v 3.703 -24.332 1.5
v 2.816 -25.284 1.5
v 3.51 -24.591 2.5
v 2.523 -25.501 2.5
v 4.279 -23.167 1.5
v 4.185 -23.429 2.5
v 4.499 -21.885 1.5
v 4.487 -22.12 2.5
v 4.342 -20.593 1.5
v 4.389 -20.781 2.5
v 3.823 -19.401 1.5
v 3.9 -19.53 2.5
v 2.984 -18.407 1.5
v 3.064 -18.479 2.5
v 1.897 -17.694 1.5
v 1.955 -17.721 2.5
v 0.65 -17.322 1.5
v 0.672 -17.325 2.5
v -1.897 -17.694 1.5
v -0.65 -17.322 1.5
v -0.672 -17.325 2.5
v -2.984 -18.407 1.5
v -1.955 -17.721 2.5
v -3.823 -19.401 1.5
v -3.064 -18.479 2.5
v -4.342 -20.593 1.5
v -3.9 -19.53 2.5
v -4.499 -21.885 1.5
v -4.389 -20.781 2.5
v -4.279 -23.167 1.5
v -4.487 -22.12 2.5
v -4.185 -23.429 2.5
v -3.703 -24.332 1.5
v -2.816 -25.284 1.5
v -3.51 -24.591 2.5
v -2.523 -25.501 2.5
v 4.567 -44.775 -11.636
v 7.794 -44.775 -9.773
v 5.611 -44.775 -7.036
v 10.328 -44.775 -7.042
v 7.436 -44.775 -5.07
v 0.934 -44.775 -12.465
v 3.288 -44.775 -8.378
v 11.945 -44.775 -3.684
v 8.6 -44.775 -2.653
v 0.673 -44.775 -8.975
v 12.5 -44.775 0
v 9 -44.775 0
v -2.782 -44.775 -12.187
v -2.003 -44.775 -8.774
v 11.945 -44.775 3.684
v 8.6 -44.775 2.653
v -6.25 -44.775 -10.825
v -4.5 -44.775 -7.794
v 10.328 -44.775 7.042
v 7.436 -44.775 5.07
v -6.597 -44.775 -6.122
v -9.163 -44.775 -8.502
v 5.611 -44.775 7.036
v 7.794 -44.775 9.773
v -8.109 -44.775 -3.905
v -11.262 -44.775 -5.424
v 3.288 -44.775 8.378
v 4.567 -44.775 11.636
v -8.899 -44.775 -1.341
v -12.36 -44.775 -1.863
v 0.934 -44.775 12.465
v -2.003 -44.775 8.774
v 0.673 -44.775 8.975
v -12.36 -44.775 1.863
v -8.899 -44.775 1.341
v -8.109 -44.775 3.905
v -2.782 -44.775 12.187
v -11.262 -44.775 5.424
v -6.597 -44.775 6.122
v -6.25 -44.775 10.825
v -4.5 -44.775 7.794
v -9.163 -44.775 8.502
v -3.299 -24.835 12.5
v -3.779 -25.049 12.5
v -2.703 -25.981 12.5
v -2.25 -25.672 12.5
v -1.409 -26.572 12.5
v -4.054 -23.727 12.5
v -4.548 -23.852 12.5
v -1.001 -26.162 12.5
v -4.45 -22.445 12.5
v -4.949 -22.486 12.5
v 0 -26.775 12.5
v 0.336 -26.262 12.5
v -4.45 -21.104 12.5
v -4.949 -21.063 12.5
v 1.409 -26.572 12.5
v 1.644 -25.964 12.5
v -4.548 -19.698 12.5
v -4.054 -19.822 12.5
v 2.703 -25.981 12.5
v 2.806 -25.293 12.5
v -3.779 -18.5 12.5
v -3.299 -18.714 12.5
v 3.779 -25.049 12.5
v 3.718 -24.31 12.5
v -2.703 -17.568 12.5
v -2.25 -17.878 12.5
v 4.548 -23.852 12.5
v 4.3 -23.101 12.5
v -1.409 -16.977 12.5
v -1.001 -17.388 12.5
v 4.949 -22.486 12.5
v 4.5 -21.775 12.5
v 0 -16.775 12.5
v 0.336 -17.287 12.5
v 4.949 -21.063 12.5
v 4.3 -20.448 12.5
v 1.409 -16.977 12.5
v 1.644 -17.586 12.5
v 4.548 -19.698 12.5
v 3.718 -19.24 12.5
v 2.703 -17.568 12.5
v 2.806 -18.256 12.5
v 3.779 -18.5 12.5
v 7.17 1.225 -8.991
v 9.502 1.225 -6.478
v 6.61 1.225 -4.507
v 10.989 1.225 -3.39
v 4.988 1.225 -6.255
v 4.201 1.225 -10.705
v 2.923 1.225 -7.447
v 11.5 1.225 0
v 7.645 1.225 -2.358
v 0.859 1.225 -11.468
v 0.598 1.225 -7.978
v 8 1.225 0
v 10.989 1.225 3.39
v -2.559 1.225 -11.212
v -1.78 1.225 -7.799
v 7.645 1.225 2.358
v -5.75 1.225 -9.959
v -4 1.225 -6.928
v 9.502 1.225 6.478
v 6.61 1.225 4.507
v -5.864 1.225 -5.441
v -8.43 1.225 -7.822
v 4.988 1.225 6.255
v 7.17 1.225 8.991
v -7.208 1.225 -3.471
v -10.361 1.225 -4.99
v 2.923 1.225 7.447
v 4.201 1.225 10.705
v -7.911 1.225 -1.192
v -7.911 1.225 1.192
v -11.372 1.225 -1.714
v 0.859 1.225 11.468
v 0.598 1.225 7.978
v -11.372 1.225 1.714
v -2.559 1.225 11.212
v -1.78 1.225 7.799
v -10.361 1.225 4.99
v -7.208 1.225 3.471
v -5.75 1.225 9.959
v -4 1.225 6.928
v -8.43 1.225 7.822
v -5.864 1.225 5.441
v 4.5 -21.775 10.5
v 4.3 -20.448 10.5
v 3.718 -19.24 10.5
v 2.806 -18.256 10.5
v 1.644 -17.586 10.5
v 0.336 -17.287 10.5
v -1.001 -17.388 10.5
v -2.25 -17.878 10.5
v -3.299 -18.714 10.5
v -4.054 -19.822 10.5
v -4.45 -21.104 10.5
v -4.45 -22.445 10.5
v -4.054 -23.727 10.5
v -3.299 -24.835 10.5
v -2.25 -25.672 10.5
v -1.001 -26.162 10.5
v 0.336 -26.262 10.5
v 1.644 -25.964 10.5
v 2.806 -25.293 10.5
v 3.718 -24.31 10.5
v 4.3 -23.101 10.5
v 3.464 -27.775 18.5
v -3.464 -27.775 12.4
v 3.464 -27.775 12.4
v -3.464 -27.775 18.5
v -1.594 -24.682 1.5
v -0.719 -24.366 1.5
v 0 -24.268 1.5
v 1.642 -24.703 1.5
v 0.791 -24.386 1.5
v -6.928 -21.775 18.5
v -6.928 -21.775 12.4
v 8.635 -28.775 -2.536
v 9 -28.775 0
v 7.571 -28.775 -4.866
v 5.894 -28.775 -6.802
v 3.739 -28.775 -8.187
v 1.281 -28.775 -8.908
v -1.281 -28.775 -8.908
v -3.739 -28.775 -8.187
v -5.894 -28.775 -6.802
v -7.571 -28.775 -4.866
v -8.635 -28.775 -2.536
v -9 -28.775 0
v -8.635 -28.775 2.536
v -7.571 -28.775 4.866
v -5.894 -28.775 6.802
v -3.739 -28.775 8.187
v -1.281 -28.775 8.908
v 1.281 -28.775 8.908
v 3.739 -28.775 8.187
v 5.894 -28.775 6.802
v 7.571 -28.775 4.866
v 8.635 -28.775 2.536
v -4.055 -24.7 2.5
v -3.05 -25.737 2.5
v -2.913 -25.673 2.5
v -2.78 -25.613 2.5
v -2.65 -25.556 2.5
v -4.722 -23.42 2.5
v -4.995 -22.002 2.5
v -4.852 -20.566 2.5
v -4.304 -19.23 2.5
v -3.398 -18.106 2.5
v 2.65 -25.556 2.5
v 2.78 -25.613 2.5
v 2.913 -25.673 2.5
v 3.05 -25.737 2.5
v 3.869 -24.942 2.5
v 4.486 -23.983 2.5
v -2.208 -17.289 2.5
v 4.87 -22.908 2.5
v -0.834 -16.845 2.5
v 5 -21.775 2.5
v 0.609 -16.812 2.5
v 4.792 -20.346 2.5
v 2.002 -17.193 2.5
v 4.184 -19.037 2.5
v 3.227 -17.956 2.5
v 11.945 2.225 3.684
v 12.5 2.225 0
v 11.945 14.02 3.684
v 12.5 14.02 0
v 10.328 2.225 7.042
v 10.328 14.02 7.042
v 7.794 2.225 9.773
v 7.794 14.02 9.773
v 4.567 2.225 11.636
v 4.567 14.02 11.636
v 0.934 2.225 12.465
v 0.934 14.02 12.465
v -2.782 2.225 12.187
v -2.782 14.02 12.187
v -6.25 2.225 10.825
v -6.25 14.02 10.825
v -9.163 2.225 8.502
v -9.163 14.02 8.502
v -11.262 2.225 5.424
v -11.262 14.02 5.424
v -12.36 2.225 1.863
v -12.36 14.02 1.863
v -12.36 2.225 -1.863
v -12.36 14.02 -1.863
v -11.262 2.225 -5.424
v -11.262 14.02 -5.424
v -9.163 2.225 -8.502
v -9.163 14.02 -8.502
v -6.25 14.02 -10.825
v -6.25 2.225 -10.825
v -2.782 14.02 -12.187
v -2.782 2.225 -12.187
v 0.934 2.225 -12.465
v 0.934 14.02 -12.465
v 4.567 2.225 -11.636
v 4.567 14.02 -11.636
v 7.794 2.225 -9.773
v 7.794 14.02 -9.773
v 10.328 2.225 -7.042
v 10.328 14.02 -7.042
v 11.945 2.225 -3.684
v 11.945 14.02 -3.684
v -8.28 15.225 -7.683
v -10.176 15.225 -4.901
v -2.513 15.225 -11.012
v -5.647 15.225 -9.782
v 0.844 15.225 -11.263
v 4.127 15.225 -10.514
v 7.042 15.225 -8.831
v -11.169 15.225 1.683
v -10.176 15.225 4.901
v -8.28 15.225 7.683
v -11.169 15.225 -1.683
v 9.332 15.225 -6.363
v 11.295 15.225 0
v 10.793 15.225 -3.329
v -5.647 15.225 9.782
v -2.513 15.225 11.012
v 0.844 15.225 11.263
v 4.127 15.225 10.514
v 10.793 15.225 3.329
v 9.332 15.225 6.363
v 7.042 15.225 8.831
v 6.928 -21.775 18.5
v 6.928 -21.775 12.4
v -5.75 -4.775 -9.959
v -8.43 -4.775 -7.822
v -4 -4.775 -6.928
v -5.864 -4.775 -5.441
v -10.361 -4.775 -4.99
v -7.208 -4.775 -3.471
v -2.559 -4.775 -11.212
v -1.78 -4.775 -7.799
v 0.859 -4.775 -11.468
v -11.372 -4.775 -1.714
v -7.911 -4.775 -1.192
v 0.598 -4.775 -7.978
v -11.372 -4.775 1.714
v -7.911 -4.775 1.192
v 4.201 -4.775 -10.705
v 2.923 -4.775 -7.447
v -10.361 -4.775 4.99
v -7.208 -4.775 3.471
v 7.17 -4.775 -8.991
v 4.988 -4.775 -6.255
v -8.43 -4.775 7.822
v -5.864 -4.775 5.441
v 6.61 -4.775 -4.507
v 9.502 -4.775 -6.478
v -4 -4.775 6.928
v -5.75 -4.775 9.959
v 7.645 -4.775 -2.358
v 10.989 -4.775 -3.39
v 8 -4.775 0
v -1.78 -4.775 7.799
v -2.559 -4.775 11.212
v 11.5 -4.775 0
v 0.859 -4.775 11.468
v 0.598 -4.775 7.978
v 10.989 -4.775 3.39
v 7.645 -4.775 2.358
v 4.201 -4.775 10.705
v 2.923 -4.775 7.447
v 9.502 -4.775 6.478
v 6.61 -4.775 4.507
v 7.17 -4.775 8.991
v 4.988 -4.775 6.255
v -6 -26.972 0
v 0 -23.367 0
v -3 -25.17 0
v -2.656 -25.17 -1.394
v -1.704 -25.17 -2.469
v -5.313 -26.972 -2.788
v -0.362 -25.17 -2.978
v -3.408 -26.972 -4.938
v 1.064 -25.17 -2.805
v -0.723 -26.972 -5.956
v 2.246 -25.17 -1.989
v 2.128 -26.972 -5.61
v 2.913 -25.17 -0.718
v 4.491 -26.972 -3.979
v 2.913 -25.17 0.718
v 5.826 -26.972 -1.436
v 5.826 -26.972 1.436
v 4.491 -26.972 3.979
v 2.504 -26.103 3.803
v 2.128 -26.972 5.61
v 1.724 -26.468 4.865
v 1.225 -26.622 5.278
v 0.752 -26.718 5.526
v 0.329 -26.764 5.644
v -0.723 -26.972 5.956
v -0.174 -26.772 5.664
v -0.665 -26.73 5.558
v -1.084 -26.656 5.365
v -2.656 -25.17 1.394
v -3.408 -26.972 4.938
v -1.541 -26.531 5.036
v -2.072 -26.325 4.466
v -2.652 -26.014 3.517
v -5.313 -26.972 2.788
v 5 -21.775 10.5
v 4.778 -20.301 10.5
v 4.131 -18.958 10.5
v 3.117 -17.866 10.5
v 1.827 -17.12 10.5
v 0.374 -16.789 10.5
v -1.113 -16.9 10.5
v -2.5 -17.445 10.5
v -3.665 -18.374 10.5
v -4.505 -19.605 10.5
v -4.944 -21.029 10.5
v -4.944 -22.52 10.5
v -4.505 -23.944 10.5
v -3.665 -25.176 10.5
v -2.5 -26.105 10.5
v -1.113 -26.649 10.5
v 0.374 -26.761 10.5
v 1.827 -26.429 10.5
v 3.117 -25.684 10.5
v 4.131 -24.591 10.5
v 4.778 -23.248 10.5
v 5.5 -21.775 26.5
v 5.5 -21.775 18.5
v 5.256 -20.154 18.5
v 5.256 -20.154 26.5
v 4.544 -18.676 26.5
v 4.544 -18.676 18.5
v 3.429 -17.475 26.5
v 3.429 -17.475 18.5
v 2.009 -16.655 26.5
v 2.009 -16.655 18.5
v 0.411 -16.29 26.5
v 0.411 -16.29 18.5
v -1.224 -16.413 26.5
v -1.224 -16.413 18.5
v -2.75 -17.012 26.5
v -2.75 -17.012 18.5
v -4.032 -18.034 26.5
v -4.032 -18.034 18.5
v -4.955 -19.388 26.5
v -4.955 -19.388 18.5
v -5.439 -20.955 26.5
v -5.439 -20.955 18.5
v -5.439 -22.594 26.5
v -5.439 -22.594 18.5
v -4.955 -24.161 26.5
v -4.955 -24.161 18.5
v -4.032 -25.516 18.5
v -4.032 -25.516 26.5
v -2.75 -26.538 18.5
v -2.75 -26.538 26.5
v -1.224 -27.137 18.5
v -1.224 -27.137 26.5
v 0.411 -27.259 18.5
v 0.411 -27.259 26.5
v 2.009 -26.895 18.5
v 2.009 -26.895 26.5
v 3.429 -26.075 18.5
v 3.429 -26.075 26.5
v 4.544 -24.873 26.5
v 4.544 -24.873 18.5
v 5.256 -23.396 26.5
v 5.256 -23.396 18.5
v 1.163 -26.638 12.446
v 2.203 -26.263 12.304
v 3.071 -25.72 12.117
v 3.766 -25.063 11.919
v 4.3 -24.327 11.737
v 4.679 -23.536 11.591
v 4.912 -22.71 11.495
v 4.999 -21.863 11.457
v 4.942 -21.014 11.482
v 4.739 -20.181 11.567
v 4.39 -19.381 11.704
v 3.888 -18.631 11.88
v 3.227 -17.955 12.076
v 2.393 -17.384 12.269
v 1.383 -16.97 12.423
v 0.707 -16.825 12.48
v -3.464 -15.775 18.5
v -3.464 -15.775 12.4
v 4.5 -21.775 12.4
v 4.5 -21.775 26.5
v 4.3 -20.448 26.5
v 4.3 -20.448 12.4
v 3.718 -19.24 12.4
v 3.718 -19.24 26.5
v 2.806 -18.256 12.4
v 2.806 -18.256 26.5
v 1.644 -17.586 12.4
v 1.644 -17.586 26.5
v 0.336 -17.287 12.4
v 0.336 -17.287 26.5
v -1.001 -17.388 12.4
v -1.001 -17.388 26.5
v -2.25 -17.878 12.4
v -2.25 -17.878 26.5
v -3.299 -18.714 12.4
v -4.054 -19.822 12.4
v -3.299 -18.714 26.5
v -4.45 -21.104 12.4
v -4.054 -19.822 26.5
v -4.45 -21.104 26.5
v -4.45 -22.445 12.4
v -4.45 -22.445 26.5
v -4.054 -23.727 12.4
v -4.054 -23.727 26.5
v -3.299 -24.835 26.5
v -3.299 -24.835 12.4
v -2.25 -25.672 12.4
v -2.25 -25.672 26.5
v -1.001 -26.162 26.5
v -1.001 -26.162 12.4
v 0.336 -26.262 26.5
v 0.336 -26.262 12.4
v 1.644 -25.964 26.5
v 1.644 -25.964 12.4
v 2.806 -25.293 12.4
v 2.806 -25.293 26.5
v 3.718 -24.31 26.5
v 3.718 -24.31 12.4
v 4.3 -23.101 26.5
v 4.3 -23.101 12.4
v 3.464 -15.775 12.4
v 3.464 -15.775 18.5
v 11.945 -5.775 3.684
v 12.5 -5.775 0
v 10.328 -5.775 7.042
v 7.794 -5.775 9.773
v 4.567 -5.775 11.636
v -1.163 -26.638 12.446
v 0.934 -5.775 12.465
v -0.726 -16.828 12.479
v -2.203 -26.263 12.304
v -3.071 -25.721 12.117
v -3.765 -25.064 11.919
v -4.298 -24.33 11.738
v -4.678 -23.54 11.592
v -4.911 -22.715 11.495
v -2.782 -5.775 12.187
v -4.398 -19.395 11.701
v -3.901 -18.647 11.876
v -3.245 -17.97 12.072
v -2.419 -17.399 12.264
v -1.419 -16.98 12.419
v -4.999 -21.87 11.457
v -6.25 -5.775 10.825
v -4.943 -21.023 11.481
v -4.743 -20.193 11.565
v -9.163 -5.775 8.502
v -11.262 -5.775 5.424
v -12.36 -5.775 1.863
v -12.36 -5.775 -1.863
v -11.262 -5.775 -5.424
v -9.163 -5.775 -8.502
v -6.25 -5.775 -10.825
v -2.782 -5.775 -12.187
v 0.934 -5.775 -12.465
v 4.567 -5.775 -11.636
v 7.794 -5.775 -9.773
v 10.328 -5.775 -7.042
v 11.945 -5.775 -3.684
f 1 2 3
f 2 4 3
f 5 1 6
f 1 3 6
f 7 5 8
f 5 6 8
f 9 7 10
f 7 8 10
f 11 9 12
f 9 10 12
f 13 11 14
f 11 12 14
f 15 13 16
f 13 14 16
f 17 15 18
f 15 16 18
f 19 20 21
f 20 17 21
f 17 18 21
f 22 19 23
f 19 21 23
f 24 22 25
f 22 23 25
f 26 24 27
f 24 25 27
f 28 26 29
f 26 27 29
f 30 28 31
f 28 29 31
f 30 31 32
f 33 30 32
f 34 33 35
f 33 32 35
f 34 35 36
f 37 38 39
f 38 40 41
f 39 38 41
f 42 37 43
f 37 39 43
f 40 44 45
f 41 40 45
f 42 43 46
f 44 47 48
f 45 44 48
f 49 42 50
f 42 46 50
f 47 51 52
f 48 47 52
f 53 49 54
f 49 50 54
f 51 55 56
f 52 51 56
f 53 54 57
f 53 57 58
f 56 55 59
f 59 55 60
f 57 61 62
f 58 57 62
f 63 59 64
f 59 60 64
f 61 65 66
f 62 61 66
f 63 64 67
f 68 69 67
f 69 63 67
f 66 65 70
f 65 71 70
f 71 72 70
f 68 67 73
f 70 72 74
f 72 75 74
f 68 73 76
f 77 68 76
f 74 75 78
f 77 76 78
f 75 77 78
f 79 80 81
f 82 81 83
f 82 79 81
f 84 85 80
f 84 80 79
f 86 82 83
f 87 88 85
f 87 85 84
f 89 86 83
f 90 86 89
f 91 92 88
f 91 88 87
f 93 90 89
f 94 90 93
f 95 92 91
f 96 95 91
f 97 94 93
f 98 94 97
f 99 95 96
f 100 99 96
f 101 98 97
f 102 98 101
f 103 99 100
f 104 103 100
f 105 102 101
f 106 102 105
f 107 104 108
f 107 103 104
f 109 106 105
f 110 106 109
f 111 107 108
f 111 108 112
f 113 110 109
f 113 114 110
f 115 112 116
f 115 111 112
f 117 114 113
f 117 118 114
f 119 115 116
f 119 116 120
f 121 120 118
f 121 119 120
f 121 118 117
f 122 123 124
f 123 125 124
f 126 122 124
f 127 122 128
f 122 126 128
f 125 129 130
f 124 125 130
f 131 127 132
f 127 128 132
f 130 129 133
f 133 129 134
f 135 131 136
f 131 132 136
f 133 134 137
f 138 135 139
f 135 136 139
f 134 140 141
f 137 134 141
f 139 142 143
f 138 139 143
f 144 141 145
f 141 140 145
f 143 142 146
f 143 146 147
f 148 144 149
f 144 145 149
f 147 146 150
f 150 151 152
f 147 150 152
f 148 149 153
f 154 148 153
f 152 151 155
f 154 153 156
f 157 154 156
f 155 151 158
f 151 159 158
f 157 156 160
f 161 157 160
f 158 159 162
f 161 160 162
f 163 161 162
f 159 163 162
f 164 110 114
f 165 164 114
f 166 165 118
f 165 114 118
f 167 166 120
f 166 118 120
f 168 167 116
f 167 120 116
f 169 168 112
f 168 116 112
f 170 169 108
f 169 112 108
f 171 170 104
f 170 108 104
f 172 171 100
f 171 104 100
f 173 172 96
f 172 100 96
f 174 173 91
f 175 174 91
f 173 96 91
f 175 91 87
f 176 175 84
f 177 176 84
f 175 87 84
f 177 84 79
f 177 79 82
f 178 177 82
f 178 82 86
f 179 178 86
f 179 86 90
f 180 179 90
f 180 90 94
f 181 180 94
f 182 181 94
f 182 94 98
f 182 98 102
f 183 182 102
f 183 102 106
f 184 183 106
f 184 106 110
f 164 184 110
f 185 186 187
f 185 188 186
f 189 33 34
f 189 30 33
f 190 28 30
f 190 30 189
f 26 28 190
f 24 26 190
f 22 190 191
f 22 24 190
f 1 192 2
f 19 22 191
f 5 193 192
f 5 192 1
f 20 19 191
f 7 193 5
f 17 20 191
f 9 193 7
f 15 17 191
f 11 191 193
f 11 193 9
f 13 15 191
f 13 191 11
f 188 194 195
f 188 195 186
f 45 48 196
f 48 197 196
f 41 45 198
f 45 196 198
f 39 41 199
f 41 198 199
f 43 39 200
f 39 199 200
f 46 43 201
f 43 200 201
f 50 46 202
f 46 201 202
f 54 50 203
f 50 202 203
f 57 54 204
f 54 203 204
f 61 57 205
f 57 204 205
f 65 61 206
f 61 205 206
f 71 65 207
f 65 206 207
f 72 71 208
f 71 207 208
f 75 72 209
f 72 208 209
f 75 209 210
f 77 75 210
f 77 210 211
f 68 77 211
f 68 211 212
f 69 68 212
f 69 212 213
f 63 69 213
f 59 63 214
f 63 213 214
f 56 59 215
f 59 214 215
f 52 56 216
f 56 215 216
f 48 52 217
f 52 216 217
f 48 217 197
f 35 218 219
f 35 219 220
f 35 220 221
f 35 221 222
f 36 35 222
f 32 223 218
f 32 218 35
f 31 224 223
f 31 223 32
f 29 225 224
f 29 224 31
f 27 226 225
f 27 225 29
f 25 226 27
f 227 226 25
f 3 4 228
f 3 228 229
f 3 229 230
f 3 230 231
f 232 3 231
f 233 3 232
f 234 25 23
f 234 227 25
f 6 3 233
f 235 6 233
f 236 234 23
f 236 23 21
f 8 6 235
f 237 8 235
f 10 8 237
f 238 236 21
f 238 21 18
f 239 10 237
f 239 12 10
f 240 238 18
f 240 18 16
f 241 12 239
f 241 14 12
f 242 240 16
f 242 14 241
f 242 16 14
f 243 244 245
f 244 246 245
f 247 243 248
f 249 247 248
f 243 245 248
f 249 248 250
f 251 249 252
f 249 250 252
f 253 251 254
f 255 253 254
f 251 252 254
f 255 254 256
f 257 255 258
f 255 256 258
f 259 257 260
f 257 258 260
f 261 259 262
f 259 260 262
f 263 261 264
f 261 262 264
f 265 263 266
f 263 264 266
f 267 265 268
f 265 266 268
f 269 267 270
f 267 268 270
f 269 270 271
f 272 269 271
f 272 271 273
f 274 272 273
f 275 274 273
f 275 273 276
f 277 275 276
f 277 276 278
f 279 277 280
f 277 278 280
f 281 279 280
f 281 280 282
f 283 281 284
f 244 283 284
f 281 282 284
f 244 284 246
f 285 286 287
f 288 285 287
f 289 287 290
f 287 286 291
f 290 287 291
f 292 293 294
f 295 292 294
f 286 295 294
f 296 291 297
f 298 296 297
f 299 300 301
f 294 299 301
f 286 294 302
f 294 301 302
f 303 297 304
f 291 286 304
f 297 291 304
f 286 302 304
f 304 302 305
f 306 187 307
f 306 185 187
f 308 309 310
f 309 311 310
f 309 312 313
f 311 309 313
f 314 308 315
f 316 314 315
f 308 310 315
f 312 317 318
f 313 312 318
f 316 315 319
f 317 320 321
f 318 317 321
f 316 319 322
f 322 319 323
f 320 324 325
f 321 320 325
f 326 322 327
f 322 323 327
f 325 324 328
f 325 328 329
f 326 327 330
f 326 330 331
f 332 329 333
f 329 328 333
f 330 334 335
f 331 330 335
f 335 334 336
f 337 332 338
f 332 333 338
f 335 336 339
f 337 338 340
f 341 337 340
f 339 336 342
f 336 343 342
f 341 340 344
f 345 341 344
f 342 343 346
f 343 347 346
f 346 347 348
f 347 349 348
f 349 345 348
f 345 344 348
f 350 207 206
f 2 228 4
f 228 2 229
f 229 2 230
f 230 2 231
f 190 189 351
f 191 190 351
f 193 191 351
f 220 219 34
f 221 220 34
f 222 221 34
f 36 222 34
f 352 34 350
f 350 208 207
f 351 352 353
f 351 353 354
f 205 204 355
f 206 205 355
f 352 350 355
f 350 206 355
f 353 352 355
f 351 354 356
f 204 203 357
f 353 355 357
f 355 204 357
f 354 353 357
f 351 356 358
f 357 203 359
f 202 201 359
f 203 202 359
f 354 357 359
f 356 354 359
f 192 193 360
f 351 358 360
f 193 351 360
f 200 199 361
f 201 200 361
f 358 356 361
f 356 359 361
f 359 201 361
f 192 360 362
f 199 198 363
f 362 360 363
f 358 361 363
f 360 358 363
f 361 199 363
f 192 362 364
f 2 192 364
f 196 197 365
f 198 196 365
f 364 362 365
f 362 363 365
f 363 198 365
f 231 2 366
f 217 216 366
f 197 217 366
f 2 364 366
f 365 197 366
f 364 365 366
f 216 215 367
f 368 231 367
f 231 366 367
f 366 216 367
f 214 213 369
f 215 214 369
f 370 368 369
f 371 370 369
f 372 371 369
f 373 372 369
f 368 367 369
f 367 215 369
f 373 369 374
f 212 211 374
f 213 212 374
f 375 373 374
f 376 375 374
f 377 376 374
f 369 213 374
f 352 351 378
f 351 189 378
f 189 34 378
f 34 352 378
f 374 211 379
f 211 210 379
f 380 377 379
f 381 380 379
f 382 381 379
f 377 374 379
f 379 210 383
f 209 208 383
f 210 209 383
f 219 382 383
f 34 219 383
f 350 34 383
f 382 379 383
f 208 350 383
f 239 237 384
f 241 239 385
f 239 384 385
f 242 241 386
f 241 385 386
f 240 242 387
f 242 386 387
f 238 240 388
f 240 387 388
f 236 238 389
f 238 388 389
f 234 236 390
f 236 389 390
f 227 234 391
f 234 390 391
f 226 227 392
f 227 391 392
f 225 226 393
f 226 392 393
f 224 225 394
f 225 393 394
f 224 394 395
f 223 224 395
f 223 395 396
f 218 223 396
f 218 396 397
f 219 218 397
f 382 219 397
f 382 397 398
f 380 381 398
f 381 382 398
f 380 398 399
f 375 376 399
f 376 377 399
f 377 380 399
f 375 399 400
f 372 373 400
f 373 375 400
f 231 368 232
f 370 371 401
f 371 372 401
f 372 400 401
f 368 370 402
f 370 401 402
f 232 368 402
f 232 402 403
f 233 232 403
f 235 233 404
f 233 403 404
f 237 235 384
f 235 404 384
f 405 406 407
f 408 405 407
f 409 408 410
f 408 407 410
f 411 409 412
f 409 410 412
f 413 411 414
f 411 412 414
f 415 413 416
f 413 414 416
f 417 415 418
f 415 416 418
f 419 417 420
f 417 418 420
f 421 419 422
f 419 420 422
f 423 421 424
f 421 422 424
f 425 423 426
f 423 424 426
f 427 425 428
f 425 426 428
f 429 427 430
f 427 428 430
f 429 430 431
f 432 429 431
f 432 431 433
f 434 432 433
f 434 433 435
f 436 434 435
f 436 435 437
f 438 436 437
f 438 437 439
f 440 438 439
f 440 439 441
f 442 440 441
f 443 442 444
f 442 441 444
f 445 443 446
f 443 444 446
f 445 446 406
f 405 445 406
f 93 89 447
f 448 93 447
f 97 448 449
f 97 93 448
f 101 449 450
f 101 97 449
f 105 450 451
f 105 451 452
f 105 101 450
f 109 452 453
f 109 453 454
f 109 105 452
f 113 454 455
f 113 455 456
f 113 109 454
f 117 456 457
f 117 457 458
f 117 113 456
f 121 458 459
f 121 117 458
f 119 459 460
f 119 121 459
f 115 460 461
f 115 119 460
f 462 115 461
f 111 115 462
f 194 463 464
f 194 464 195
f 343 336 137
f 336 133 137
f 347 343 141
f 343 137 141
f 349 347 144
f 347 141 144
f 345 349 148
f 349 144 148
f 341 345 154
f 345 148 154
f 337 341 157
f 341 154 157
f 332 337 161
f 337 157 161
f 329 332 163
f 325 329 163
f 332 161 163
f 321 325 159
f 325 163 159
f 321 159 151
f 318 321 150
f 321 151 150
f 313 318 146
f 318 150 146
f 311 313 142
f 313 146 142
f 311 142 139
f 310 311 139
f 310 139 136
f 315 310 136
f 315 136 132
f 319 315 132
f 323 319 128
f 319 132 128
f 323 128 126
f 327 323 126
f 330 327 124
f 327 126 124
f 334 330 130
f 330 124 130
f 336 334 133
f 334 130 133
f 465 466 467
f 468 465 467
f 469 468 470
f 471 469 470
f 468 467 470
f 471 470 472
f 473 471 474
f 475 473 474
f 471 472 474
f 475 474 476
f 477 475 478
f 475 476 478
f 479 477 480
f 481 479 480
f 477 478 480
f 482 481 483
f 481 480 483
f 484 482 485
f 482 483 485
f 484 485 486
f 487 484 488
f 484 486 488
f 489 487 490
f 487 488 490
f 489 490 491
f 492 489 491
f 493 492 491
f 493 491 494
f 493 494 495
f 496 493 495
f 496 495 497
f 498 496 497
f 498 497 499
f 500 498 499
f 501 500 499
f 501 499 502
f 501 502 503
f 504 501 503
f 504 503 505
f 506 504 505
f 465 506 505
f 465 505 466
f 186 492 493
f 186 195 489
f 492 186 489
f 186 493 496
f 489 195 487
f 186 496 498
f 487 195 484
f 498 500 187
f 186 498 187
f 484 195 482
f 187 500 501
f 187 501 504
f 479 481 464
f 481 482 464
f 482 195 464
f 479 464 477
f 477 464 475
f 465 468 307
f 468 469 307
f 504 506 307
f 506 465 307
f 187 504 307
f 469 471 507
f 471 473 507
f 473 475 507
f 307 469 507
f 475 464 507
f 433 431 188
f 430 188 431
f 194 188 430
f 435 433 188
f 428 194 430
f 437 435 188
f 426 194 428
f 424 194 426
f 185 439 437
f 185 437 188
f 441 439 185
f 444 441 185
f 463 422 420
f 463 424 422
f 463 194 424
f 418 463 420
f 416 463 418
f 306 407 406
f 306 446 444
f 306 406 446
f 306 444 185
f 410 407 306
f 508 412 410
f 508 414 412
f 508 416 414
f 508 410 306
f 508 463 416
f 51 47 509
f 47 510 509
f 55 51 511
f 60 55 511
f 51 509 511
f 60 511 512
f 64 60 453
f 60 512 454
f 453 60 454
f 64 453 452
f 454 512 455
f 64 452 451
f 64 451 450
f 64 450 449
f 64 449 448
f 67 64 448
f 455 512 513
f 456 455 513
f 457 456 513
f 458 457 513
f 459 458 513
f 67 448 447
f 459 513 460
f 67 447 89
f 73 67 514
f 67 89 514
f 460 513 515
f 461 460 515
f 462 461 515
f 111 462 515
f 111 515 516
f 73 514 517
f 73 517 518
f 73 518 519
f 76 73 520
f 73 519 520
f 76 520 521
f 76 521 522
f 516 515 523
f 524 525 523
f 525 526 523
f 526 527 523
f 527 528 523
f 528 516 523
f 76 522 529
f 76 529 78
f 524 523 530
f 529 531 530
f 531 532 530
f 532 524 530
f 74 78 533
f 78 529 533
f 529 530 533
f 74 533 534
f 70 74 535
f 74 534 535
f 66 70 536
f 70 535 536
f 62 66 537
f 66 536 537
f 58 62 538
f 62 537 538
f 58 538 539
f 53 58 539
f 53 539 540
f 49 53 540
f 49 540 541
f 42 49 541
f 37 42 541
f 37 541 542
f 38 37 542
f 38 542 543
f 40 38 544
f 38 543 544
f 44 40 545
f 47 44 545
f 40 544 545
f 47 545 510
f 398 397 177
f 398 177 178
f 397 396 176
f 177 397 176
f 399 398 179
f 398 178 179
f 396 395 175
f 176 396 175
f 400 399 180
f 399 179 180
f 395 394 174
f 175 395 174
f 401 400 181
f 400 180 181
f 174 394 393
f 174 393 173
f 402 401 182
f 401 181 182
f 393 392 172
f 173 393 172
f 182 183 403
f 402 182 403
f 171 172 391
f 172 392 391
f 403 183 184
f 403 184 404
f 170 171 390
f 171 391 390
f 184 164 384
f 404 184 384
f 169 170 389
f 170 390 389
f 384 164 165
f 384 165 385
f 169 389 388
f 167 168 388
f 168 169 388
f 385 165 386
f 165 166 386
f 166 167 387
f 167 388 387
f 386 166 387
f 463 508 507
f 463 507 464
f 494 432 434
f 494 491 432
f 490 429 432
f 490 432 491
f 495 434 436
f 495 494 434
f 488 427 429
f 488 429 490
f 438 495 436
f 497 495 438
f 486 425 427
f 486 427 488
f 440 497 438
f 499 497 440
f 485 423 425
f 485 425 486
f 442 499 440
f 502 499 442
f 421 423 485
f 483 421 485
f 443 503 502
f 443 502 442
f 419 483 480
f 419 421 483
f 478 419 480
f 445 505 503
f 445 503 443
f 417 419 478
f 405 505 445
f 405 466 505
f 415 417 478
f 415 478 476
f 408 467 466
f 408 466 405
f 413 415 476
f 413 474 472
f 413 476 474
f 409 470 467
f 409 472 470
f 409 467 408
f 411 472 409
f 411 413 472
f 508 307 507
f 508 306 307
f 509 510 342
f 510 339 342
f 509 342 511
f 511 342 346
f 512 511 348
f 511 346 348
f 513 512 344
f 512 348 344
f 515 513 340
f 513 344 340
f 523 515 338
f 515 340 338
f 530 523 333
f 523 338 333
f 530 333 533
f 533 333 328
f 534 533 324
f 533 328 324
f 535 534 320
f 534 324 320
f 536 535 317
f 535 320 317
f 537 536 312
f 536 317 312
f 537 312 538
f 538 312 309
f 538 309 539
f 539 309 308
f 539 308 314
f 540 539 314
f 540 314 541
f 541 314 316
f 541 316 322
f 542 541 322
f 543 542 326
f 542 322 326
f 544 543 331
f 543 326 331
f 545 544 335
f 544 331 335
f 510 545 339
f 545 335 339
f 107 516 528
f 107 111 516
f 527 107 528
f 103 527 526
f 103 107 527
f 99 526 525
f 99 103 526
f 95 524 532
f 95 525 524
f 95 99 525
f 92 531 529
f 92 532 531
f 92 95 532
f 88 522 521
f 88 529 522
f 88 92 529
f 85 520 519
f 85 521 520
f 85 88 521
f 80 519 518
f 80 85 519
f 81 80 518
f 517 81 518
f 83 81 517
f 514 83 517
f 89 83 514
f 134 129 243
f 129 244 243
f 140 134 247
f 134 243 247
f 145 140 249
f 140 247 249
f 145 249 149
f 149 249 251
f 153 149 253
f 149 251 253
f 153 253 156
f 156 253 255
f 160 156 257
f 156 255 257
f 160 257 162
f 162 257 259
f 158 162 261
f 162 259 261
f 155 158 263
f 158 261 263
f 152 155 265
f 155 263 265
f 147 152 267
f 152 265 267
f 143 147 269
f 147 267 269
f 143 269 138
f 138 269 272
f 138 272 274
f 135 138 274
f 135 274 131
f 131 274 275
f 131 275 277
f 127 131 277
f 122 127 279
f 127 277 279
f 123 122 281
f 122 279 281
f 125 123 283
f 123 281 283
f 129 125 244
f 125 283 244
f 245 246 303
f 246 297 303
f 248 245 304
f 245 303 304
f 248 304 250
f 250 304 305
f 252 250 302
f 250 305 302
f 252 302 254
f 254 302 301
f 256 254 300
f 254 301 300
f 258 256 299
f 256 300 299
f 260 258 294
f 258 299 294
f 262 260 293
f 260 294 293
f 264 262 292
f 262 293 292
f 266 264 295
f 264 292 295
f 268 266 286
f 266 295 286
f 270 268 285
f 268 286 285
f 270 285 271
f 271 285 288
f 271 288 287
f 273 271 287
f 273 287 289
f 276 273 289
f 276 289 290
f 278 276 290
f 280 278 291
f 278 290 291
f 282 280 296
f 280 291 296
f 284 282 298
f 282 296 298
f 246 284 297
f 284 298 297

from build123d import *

# Parameters (mm, degrees)
M20X2_0_TAPPED_HOLE1_D     = 18
M20X2_0_TAPPED_HOLE1_DEPTH = 16
M20X2_0_TAPPED_HOLE1_TIP   = 5.407745571
CUT_EXTRUDE1_START         = 12.5
SKETCH5_R                  = 5
CUT_EXTRUDE1_DEPTH         = 10
SKETCH6_R                  = 5
BOSS_EXTRUDE1_DEPTH        = 2
BOSS_EXTRUDE2_DEPTH        = 6
BOSS_EXTRUDE2_DEPTH_BACK   = 0.1
SKETCH8_R                  = 5.5
BOSS_EXTRUDE3_DEPTH        = 8
SKETCH9_R                  = 4.5
CUT_EXTRUDE2_DEPTH         = 25


with BuildPart() as part:
    # Sketch1 → Revolve1 (revolve)
    with BuildSketch(Plane.XY):
        Polygon((0, -44.774695914), (12.5, -44.774695914), (12.5, -5.774695914), (11.5, -4.774695914), (8, -4.774695914), (8, 1.225304086), (11.5, 1.225304086), (12.5, 2.225304086), (12.5, 14.020232183), (11.294928097, 15.225304086), (0, 15.225304086), align=None)
    revolve(axis=Axis((0, 17.675111153, 0), (0, -1, 0)))

    # M20x2.0 Tapped Hole1
    with Locations(Plane(origin=(0, -44.774695914, 0), x_dir=(-1, 0, 0), z_dir=(0, -1, 0))):
        with Locations((0, 0)):
            Hole(M20X2_0_TAPPED_HOLE1_D / 2, depth=M20X2_0_TAPPED_HOLE1_DEPTH)
            with Locations((0, 0, -(M20X2_0_TAPPED_HOLE1_DEPTH + M20X2_0_TAPPED_HOLE1_TIP / 2))):  # 118° drill point
                Cone(0, M20X2_0_TAPPED_HOLE1_D / 2, M20X2_0_TAPPED_HOLE1_TIP, mode=Mode.SUBTRACT)

    # Sketch5 → Cut-Extrude1 (cut)
    with BuildSketch(Plane.XY.offset(CUT_EXTRUDE1_START)):
        with Locations((0, -21.774695914)):
            Circle(SKETCH5_R)
    extrude(amount=-CUT_EXTRUDE1_DEPTH, mode=Mode.SUBTRACT)

    # Sketch6 → Boss-Extrude1 (add)
    with BuildSketch(Plane.XY.offset(12.5)):
        with Locations((0, -21.774695914)):
            Circle(SKETCH6_R)
    extrude(amount=-BOSS_EXTRUDE1_DEPTH)


with BuildPart() as body_2:
    # Sketch7 → Boss-Extrude2 (new body, two sides)
    with BuildSketch(Plane.XY.offset(12.5)) as boss_extrude2_sk:
        Polygon((6.92820323, -21.774695914), (3.464101615, -15.774695914), (-3.464101615, -15.774695914), (-6.92820323, -21.774695914), (-3.464101615, -27.774695914), (3.464101615, -27.774695914), align=None)
    extrude(amount=BOSS_EXTRUDE2_DEPTH)
    extrude(boss_extrude2_sk.sketch, amount=-BOSS_EXTRUDE2_DEPTH_BACK)

    # Sketch8 → Boss-Extrude3 (add)
    with BuildSketch(Plane.XY.offset(18.5)):
        with Locations((0, -21.774695914)):
            Circle(SKETCH8_R)
    extrude(amount=BOSS_EXTRUDE3_DEPTH)


with BuildPart() as cut_extrude2_tool:
    # Sketch9 → Cut-Extrude2 (new body)
    with BuildSketch(Plane.XY.offset(26.5)):
        with Locations((0, -21.774695914)):
            Circle(SKETCH9_R)
    extrude(amount=-CUT_EXTRUDE2_DEPTH)


with BuildPart() as part_1:
    add(part.part)

    # Cut-Extrude2: cut by cut_extrude2_tool
    add(cut_extrude2_tool.part, mode=Mode.SUBTRACT)


with BuildPart() as body_2_1:
    add(body_2.part)

    # Cut-Extrude2: cut by cut_extrude2_tool
    add(cut_extrude2_tool.part, mode=Mode.SUBTRACT)


solid = Compound([part_1.part, body_2_1.part])
